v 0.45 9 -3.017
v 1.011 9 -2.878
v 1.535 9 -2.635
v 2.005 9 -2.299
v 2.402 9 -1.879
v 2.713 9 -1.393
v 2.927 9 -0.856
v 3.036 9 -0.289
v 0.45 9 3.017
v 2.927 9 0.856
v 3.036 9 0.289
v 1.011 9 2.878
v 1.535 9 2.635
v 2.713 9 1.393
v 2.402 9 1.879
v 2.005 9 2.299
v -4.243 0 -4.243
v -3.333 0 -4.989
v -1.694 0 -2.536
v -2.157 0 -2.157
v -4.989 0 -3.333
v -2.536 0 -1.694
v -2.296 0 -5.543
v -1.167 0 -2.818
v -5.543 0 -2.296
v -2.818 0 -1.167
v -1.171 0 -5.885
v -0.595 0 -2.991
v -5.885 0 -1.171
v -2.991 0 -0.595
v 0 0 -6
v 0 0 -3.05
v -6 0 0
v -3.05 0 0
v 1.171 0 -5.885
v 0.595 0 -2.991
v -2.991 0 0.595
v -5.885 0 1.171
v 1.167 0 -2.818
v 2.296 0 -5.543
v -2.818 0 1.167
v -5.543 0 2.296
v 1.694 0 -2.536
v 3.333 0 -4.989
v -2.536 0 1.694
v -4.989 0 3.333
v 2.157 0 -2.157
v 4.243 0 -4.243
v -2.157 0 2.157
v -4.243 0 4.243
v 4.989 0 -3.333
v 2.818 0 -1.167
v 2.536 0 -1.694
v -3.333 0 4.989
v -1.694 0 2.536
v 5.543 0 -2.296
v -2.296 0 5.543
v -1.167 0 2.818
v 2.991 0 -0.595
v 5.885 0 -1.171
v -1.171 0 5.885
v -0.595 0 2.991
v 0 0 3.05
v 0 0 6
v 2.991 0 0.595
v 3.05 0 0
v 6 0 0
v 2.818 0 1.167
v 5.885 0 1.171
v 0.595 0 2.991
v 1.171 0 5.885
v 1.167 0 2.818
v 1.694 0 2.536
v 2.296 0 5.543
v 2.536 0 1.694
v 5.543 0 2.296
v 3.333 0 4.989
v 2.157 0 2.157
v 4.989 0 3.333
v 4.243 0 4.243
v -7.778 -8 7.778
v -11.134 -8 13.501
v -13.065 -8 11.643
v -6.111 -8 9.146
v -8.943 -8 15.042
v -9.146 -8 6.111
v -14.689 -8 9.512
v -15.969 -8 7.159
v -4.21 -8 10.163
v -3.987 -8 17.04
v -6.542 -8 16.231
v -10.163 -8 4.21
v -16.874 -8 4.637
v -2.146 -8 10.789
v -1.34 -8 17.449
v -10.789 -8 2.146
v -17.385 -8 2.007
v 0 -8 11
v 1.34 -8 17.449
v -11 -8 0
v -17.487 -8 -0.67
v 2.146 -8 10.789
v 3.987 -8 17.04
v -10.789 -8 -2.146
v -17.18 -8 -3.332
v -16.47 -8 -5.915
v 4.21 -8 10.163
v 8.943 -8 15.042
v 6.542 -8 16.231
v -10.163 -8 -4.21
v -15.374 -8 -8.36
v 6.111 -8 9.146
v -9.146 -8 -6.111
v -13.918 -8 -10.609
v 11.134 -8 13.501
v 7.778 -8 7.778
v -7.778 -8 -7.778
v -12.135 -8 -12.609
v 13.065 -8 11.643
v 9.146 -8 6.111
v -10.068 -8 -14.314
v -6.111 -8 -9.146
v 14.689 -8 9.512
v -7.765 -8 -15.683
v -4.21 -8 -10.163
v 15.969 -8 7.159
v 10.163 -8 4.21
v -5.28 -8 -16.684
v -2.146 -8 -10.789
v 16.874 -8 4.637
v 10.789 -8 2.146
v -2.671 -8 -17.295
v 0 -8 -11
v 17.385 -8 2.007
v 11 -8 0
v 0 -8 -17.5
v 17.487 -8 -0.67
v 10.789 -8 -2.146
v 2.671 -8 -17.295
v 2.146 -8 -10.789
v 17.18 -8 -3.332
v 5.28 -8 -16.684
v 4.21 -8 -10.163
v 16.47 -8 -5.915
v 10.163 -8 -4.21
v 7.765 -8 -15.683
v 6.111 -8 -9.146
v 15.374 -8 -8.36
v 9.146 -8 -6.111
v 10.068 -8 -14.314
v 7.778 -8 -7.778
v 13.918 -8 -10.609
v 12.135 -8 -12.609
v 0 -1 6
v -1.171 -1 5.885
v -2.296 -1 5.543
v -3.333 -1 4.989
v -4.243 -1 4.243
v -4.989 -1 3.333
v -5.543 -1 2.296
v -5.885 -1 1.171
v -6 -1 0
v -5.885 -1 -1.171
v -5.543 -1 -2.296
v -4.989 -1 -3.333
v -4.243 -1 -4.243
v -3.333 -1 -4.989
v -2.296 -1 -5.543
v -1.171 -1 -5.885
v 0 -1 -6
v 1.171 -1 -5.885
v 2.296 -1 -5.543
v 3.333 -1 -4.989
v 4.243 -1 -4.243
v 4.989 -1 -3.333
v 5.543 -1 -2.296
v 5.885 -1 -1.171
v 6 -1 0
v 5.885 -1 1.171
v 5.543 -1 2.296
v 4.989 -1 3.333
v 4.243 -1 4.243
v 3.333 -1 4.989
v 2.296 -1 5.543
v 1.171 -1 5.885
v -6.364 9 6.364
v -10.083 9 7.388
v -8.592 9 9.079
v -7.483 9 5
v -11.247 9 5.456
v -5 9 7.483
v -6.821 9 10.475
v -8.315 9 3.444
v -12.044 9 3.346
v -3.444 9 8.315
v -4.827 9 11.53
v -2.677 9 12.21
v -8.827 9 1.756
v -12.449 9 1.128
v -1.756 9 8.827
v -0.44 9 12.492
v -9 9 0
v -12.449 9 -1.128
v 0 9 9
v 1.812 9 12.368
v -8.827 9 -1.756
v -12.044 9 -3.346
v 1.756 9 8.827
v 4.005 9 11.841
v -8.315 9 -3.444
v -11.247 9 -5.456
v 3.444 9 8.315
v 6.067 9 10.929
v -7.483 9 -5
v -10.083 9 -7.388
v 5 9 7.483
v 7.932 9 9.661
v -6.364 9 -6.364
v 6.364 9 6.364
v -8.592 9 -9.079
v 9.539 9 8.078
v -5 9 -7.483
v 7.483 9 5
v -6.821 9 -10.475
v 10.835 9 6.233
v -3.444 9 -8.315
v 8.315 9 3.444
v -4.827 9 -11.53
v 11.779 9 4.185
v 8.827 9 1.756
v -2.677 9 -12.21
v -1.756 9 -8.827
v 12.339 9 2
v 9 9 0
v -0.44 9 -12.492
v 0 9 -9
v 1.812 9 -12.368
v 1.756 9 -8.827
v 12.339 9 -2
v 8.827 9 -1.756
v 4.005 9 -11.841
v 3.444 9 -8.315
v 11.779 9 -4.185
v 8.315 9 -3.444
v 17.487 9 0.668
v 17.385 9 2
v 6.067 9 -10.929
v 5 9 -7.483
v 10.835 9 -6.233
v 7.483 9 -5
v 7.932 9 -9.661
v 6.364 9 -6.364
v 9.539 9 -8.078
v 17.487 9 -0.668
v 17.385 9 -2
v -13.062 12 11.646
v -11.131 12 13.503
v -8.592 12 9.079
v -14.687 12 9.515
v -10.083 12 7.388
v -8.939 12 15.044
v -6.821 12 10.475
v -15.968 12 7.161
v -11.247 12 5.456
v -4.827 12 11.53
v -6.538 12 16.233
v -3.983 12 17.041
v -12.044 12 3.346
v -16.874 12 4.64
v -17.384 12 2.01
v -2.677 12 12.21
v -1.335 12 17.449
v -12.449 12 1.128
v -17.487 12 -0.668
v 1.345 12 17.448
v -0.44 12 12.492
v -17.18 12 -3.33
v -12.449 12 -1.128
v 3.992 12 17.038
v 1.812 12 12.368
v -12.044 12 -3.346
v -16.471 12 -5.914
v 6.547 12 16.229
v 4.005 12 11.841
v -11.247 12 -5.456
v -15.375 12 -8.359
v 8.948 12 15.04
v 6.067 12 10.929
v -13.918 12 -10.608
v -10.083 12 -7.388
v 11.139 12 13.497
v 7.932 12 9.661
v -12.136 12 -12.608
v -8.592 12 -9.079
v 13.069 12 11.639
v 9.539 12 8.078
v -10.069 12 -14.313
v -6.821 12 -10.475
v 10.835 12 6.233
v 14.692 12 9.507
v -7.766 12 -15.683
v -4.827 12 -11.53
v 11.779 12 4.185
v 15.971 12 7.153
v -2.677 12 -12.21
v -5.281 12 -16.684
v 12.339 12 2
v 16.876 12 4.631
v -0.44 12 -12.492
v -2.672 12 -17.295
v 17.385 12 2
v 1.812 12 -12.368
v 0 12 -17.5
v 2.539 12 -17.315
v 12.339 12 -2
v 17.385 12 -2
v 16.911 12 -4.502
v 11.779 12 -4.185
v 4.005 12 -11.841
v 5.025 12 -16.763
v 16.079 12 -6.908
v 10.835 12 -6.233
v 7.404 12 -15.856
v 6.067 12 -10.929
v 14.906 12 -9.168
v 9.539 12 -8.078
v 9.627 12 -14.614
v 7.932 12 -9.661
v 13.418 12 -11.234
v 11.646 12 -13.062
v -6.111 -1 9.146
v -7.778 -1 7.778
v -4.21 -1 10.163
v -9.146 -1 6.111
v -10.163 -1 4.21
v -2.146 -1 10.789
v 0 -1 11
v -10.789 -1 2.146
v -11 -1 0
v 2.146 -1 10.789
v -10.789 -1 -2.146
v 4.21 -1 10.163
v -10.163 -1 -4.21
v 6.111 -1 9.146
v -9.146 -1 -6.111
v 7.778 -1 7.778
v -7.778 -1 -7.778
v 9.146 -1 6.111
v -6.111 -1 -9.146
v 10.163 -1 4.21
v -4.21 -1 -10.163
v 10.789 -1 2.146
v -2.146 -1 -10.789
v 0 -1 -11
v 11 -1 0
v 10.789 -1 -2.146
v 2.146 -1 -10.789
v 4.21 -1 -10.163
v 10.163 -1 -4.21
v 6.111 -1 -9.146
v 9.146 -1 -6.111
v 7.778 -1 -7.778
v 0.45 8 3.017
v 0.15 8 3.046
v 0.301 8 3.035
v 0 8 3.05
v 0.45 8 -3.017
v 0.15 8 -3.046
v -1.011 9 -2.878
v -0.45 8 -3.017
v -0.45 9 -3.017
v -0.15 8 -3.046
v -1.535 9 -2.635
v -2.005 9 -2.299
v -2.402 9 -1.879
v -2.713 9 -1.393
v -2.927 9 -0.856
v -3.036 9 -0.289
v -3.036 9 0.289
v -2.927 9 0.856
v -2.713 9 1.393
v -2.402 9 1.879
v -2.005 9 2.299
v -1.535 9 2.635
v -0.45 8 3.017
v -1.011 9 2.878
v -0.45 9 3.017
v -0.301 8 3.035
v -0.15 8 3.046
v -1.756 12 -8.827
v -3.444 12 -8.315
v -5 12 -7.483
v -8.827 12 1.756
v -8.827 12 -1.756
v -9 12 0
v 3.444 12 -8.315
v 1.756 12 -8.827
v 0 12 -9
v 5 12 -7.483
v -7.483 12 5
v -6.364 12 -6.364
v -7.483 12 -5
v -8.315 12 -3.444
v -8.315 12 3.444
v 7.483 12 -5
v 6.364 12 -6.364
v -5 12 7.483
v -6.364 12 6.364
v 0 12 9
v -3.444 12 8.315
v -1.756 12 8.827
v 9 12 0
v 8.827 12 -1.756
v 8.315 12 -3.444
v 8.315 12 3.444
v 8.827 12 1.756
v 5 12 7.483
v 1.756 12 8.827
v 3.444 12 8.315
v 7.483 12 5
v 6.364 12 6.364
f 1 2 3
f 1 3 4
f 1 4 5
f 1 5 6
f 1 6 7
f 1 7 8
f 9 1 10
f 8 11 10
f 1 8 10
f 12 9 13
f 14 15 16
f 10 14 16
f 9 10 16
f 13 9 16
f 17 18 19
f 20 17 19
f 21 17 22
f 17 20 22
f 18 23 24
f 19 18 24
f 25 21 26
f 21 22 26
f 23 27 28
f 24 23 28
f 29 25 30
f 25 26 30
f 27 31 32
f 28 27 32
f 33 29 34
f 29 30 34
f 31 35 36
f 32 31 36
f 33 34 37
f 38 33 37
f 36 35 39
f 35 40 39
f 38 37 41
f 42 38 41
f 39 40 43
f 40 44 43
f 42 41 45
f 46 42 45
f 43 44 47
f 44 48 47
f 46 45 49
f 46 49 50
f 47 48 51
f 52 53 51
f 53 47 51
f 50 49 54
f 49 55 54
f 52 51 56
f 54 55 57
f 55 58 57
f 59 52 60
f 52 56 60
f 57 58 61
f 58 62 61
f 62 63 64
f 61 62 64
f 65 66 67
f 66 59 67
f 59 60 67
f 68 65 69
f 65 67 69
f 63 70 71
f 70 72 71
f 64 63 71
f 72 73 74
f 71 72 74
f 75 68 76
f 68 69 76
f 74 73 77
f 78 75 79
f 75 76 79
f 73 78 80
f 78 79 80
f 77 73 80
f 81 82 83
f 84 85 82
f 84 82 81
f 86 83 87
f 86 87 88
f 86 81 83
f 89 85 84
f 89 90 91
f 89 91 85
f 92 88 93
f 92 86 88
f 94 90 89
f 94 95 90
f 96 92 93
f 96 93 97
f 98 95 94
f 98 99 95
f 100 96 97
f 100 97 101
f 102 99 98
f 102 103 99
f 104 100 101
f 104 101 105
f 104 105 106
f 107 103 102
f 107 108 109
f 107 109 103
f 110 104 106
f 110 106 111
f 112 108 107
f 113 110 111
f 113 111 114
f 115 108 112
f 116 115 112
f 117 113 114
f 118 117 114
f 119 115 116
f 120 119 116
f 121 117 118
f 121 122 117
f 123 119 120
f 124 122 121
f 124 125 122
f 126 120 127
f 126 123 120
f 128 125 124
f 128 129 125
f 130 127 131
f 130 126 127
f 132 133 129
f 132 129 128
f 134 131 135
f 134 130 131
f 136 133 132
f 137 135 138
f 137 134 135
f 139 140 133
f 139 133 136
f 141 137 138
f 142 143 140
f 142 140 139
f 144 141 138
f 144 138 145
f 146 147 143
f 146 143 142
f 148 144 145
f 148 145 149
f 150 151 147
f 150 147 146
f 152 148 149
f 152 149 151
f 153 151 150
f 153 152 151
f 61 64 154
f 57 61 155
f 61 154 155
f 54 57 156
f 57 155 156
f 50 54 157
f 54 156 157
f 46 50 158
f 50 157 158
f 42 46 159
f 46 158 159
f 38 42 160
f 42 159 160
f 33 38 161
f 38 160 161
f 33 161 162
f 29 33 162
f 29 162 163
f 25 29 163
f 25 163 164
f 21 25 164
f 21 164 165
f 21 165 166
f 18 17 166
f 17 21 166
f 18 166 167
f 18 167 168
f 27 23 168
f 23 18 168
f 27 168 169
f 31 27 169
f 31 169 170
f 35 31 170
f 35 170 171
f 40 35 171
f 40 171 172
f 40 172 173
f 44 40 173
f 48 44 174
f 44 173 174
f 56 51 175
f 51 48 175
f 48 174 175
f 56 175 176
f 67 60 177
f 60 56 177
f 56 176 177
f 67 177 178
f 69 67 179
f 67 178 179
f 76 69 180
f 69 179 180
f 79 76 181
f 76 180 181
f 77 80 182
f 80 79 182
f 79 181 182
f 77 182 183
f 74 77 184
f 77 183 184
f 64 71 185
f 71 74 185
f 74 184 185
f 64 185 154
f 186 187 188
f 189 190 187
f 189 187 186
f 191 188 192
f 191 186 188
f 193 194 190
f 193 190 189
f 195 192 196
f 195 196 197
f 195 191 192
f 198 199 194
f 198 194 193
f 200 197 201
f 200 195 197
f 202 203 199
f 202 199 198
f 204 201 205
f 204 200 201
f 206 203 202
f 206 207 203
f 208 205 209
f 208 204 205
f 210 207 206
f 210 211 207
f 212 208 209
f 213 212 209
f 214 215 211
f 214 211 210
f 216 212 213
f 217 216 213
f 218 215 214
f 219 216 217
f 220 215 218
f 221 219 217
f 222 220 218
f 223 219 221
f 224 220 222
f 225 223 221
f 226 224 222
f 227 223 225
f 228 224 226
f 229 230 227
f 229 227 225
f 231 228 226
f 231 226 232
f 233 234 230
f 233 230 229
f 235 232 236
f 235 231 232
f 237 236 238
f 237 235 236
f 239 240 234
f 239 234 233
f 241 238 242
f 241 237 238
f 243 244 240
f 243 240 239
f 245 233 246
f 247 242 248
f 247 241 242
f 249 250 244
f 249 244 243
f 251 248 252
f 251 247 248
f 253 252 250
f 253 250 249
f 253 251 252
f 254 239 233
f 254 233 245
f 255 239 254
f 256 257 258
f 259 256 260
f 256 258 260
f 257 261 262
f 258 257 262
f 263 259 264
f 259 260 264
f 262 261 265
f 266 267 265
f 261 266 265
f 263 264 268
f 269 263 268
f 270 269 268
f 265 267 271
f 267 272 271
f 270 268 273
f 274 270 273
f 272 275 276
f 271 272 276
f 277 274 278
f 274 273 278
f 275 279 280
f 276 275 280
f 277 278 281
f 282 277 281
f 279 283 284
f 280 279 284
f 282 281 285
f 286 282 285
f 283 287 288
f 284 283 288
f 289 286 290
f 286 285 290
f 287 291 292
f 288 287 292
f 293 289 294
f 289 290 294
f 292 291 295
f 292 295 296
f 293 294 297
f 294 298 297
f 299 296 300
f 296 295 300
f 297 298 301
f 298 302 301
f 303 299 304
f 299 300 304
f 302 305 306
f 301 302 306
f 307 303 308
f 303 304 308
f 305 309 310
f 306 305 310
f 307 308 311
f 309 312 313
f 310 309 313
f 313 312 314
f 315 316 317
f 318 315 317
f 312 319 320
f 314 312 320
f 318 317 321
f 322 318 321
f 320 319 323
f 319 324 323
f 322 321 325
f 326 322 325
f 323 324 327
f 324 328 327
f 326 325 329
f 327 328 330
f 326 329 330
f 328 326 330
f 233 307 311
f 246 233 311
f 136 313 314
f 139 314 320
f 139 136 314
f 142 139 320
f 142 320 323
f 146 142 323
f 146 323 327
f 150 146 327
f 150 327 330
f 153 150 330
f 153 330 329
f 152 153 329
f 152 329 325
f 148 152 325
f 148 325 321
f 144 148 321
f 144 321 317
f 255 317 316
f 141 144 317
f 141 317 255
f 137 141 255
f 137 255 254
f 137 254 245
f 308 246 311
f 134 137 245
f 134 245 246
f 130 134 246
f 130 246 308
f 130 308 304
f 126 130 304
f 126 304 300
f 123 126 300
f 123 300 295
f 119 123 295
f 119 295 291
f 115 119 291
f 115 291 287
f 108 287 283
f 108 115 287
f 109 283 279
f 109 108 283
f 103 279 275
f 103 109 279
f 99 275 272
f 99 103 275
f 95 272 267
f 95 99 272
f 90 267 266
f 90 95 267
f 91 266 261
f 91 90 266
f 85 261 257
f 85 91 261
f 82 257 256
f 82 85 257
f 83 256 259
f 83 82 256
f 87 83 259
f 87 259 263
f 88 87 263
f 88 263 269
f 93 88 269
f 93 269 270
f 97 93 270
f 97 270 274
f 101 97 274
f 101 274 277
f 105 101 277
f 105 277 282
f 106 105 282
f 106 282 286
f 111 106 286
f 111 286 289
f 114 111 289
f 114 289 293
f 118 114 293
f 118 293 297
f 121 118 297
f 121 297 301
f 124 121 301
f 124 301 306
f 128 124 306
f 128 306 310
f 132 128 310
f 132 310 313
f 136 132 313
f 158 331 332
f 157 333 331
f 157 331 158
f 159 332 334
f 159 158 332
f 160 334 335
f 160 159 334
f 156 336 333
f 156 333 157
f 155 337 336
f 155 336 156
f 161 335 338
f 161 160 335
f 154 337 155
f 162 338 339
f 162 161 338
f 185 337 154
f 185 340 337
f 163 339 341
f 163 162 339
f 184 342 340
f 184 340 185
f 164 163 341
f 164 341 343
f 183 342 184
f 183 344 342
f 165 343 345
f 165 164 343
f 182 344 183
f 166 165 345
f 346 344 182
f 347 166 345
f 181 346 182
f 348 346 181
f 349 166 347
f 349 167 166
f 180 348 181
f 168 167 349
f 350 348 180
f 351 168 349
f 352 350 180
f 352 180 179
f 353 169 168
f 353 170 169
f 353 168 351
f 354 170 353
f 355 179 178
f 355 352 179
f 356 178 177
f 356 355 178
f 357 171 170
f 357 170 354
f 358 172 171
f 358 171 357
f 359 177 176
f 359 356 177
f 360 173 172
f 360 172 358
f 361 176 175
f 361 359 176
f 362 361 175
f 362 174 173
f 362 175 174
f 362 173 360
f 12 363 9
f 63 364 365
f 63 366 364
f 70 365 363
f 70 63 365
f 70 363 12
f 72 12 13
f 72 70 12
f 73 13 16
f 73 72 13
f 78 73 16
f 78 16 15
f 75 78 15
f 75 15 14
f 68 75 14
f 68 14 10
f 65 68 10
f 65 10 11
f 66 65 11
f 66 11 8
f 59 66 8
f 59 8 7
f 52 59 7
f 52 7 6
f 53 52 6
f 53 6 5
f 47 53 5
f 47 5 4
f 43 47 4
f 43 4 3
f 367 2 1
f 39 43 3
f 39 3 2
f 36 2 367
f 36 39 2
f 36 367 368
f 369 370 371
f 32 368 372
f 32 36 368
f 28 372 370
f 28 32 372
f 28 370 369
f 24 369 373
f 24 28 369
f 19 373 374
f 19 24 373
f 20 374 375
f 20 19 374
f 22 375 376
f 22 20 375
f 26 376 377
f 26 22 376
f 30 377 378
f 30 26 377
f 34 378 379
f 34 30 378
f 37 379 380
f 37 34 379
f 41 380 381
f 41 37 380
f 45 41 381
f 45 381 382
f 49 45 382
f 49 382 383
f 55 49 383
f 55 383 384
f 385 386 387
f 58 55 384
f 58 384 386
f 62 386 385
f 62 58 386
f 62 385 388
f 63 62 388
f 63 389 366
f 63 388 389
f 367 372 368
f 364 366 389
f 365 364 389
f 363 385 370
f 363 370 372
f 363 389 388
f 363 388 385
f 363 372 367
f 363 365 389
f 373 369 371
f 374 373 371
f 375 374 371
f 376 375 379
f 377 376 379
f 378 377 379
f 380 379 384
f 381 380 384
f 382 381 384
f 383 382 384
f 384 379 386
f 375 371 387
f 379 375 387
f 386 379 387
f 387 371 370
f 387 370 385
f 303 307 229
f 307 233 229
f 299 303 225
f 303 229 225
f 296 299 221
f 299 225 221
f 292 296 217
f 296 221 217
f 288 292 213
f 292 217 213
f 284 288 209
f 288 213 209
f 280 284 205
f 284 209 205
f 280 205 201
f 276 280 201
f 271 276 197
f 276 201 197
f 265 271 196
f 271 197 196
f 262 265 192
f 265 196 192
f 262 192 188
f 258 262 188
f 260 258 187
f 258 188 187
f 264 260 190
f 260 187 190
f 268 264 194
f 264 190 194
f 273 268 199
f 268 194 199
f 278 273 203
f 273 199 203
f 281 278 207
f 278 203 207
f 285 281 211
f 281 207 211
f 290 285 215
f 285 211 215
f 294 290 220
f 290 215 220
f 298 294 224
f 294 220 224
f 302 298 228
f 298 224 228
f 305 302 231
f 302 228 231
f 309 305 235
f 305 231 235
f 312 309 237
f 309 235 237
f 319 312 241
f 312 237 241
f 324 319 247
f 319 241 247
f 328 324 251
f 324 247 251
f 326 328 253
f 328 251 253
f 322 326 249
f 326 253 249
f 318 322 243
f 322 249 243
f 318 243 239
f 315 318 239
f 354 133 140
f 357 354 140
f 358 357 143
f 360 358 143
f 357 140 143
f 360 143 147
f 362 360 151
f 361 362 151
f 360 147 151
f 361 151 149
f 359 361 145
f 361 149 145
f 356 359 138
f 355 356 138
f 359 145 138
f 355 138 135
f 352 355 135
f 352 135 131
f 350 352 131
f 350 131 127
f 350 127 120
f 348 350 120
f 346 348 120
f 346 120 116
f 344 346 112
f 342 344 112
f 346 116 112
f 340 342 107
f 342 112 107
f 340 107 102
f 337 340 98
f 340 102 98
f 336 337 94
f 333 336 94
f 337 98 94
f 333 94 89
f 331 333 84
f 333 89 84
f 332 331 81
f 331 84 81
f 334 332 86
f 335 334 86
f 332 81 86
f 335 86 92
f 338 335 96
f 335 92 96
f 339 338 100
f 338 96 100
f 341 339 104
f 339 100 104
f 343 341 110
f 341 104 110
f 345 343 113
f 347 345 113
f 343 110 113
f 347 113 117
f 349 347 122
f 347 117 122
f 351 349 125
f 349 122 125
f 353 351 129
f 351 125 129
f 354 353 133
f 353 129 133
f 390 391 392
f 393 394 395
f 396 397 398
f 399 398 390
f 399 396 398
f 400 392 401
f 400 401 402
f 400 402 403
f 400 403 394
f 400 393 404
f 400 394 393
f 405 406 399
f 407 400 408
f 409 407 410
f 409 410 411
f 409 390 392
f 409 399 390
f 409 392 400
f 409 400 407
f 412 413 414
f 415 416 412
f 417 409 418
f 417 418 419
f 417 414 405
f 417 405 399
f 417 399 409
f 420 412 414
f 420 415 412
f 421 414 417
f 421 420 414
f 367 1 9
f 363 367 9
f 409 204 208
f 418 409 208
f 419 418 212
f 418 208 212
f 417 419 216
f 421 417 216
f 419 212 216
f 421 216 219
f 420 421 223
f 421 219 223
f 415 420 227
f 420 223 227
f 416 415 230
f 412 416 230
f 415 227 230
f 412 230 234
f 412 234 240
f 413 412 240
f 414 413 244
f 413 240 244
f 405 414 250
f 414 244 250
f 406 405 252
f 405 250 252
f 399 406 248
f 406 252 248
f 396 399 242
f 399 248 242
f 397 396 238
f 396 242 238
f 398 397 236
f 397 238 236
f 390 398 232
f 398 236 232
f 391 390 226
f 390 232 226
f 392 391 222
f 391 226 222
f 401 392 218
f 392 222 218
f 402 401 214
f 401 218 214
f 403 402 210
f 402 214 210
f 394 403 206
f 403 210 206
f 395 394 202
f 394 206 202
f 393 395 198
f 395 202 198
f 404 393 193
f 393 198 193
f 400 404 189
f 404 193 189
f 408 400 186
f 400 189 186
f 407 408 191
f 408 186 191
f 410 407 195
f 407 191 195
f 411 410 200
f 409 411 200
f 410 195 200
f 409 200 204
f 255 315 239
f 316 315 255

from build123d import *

# Parameters (mm, degrees)
SKETCH_1_R          = 6
SKETCH_1_R_2        = 3.05
EXTRUDE_1_DEPTH     = 9
SKETCH_2_R          = 9
EXTRUDE_2_DEPTH     = 3
SKETCH_3_W          = 0.9
SKETCH_3_H          = 8.759425964
EXTRUDE_3_DEPTH     = 1
EXTRUDE_START       = 10
SKETCH_4_R          = 12.5
SKETCH_4_R_2        = 6
EXTRUDE_4_DEPTH     = 10
EXTRUDE_START_2     = 7
SKETCH_5_R          = 12.5
SKETCH_5_R_2        = 11
EXTRUDE_5_DEPTH     = 7
SKETCH_6_R          = 17.5
SKETCH_6_R_2        = 12.5
EXTRUDE_6_DEPTH     = 20
SKETCH_7_W          = 11.223410854
SKETCH_7_H          = 4
CUT_EXTRUDE_1_DEPTH = 3


with BuildPart() as part:
    # 草图1 → 凸台-拉伸1 (new body)
    with BuildSketch(Plane(origin=(0, 0, 0), x_dir=(1, 0, 0), z_dir=(0, 1, 0))):
        with Locations(Location((0, 0, 0), (0, 0, 270))):
            Circle(SKETCH_1_R)
        with Locations(Location((0, 0, 0), (0, 0, 270))):
            Circle(SKETCH_1_R_2, mode=Mode.SUBTRACT)
    extrude(amount=EXTRUDE_1_DEPTH)

    # 草图2 → 凸台-拉伸2 (add)
    with BuildSketch(Plane(origin=(0, 9, 0), x_dir=(1, 0, 0), z_dir=(0, 1, 0))):
        with Locations(Location((0, 0, 0), (0, 0, 270))):
            Circle(SKETCH_2_R)
    extrude(amount=EXTRUDE_2_DEPTH)

    # 草图3 → 凸台-拉伸3 (add)
    with BuildSketch(Plane.XZ.offset(-9)):
        Rectangle(SKETCH_3_W, SKETCH_3_H)
    extrude(amount=EXTRUDE_3_DEPTH)

    # 草图4 → 凸台-拉伸4 (add)
    with BuildSketch(Plane.XZ.offset(-9).offset(EXTRUDE_START)):
        with Locations(Location((0, 0, 0), (0, 0, 270))):
            Circle(SKETCH_4_R)
        with Locations(Location((0, 0, 0), (0, 0, 90))):
            Circle(SKETCH_4_R_2, mode=Mode.SUBTRACT)
    extrude(amount=-EXTRUDE_4_DEPTH)

    # 草图5 → 凸台-拉伸5 (add)
    with BuildSketch(Plane.XZ.offset(1).offset(EXTRUDE_START_2)):
        with Locations(Location((0, 0, 0), (0, 0, 270))):
            Circle(SKETCH_5_R)
        with Locations(Location((0, 0, 0), (0, 0, 270))):
            Circle(SKETCH_5_R_2, mode=Mode.SUBTRACT)
    extrude(amount=-EXTRUDE_5_DEPTH)

    # 草图6 → 凸台-拉伸6 (add)
    with BuildSketch(Plane.XZ.offset(8)):
        with Locations(Location((0, 0, 0), (0, 0, 270))):
            Circle(SKETCH_6_R)
        with Locations(Location((0, 0, 0), (0, 0, 270))):
            Circle(SKETCH_6_R_2, mode=Mode.SUBTRACT)
    extrude(amount=-EXTRUDE_6_DEPTH)

    # 草图7 → 切除-拉伸1 (cut)
    with BuildSketch(Plane(origin=(0, 12, 0), x_dir=(1, 0, 0), z_dir=(0, 1, 0))):
        with Locations((17.5, 0)):
            Rectangle(SKETCH_7_W, SKETCH_7_H)
    extrude(amount=-CUT_EXTRUDE_1_DEPTH, mode=Mode.SUBTRACT)


solid = part.part
